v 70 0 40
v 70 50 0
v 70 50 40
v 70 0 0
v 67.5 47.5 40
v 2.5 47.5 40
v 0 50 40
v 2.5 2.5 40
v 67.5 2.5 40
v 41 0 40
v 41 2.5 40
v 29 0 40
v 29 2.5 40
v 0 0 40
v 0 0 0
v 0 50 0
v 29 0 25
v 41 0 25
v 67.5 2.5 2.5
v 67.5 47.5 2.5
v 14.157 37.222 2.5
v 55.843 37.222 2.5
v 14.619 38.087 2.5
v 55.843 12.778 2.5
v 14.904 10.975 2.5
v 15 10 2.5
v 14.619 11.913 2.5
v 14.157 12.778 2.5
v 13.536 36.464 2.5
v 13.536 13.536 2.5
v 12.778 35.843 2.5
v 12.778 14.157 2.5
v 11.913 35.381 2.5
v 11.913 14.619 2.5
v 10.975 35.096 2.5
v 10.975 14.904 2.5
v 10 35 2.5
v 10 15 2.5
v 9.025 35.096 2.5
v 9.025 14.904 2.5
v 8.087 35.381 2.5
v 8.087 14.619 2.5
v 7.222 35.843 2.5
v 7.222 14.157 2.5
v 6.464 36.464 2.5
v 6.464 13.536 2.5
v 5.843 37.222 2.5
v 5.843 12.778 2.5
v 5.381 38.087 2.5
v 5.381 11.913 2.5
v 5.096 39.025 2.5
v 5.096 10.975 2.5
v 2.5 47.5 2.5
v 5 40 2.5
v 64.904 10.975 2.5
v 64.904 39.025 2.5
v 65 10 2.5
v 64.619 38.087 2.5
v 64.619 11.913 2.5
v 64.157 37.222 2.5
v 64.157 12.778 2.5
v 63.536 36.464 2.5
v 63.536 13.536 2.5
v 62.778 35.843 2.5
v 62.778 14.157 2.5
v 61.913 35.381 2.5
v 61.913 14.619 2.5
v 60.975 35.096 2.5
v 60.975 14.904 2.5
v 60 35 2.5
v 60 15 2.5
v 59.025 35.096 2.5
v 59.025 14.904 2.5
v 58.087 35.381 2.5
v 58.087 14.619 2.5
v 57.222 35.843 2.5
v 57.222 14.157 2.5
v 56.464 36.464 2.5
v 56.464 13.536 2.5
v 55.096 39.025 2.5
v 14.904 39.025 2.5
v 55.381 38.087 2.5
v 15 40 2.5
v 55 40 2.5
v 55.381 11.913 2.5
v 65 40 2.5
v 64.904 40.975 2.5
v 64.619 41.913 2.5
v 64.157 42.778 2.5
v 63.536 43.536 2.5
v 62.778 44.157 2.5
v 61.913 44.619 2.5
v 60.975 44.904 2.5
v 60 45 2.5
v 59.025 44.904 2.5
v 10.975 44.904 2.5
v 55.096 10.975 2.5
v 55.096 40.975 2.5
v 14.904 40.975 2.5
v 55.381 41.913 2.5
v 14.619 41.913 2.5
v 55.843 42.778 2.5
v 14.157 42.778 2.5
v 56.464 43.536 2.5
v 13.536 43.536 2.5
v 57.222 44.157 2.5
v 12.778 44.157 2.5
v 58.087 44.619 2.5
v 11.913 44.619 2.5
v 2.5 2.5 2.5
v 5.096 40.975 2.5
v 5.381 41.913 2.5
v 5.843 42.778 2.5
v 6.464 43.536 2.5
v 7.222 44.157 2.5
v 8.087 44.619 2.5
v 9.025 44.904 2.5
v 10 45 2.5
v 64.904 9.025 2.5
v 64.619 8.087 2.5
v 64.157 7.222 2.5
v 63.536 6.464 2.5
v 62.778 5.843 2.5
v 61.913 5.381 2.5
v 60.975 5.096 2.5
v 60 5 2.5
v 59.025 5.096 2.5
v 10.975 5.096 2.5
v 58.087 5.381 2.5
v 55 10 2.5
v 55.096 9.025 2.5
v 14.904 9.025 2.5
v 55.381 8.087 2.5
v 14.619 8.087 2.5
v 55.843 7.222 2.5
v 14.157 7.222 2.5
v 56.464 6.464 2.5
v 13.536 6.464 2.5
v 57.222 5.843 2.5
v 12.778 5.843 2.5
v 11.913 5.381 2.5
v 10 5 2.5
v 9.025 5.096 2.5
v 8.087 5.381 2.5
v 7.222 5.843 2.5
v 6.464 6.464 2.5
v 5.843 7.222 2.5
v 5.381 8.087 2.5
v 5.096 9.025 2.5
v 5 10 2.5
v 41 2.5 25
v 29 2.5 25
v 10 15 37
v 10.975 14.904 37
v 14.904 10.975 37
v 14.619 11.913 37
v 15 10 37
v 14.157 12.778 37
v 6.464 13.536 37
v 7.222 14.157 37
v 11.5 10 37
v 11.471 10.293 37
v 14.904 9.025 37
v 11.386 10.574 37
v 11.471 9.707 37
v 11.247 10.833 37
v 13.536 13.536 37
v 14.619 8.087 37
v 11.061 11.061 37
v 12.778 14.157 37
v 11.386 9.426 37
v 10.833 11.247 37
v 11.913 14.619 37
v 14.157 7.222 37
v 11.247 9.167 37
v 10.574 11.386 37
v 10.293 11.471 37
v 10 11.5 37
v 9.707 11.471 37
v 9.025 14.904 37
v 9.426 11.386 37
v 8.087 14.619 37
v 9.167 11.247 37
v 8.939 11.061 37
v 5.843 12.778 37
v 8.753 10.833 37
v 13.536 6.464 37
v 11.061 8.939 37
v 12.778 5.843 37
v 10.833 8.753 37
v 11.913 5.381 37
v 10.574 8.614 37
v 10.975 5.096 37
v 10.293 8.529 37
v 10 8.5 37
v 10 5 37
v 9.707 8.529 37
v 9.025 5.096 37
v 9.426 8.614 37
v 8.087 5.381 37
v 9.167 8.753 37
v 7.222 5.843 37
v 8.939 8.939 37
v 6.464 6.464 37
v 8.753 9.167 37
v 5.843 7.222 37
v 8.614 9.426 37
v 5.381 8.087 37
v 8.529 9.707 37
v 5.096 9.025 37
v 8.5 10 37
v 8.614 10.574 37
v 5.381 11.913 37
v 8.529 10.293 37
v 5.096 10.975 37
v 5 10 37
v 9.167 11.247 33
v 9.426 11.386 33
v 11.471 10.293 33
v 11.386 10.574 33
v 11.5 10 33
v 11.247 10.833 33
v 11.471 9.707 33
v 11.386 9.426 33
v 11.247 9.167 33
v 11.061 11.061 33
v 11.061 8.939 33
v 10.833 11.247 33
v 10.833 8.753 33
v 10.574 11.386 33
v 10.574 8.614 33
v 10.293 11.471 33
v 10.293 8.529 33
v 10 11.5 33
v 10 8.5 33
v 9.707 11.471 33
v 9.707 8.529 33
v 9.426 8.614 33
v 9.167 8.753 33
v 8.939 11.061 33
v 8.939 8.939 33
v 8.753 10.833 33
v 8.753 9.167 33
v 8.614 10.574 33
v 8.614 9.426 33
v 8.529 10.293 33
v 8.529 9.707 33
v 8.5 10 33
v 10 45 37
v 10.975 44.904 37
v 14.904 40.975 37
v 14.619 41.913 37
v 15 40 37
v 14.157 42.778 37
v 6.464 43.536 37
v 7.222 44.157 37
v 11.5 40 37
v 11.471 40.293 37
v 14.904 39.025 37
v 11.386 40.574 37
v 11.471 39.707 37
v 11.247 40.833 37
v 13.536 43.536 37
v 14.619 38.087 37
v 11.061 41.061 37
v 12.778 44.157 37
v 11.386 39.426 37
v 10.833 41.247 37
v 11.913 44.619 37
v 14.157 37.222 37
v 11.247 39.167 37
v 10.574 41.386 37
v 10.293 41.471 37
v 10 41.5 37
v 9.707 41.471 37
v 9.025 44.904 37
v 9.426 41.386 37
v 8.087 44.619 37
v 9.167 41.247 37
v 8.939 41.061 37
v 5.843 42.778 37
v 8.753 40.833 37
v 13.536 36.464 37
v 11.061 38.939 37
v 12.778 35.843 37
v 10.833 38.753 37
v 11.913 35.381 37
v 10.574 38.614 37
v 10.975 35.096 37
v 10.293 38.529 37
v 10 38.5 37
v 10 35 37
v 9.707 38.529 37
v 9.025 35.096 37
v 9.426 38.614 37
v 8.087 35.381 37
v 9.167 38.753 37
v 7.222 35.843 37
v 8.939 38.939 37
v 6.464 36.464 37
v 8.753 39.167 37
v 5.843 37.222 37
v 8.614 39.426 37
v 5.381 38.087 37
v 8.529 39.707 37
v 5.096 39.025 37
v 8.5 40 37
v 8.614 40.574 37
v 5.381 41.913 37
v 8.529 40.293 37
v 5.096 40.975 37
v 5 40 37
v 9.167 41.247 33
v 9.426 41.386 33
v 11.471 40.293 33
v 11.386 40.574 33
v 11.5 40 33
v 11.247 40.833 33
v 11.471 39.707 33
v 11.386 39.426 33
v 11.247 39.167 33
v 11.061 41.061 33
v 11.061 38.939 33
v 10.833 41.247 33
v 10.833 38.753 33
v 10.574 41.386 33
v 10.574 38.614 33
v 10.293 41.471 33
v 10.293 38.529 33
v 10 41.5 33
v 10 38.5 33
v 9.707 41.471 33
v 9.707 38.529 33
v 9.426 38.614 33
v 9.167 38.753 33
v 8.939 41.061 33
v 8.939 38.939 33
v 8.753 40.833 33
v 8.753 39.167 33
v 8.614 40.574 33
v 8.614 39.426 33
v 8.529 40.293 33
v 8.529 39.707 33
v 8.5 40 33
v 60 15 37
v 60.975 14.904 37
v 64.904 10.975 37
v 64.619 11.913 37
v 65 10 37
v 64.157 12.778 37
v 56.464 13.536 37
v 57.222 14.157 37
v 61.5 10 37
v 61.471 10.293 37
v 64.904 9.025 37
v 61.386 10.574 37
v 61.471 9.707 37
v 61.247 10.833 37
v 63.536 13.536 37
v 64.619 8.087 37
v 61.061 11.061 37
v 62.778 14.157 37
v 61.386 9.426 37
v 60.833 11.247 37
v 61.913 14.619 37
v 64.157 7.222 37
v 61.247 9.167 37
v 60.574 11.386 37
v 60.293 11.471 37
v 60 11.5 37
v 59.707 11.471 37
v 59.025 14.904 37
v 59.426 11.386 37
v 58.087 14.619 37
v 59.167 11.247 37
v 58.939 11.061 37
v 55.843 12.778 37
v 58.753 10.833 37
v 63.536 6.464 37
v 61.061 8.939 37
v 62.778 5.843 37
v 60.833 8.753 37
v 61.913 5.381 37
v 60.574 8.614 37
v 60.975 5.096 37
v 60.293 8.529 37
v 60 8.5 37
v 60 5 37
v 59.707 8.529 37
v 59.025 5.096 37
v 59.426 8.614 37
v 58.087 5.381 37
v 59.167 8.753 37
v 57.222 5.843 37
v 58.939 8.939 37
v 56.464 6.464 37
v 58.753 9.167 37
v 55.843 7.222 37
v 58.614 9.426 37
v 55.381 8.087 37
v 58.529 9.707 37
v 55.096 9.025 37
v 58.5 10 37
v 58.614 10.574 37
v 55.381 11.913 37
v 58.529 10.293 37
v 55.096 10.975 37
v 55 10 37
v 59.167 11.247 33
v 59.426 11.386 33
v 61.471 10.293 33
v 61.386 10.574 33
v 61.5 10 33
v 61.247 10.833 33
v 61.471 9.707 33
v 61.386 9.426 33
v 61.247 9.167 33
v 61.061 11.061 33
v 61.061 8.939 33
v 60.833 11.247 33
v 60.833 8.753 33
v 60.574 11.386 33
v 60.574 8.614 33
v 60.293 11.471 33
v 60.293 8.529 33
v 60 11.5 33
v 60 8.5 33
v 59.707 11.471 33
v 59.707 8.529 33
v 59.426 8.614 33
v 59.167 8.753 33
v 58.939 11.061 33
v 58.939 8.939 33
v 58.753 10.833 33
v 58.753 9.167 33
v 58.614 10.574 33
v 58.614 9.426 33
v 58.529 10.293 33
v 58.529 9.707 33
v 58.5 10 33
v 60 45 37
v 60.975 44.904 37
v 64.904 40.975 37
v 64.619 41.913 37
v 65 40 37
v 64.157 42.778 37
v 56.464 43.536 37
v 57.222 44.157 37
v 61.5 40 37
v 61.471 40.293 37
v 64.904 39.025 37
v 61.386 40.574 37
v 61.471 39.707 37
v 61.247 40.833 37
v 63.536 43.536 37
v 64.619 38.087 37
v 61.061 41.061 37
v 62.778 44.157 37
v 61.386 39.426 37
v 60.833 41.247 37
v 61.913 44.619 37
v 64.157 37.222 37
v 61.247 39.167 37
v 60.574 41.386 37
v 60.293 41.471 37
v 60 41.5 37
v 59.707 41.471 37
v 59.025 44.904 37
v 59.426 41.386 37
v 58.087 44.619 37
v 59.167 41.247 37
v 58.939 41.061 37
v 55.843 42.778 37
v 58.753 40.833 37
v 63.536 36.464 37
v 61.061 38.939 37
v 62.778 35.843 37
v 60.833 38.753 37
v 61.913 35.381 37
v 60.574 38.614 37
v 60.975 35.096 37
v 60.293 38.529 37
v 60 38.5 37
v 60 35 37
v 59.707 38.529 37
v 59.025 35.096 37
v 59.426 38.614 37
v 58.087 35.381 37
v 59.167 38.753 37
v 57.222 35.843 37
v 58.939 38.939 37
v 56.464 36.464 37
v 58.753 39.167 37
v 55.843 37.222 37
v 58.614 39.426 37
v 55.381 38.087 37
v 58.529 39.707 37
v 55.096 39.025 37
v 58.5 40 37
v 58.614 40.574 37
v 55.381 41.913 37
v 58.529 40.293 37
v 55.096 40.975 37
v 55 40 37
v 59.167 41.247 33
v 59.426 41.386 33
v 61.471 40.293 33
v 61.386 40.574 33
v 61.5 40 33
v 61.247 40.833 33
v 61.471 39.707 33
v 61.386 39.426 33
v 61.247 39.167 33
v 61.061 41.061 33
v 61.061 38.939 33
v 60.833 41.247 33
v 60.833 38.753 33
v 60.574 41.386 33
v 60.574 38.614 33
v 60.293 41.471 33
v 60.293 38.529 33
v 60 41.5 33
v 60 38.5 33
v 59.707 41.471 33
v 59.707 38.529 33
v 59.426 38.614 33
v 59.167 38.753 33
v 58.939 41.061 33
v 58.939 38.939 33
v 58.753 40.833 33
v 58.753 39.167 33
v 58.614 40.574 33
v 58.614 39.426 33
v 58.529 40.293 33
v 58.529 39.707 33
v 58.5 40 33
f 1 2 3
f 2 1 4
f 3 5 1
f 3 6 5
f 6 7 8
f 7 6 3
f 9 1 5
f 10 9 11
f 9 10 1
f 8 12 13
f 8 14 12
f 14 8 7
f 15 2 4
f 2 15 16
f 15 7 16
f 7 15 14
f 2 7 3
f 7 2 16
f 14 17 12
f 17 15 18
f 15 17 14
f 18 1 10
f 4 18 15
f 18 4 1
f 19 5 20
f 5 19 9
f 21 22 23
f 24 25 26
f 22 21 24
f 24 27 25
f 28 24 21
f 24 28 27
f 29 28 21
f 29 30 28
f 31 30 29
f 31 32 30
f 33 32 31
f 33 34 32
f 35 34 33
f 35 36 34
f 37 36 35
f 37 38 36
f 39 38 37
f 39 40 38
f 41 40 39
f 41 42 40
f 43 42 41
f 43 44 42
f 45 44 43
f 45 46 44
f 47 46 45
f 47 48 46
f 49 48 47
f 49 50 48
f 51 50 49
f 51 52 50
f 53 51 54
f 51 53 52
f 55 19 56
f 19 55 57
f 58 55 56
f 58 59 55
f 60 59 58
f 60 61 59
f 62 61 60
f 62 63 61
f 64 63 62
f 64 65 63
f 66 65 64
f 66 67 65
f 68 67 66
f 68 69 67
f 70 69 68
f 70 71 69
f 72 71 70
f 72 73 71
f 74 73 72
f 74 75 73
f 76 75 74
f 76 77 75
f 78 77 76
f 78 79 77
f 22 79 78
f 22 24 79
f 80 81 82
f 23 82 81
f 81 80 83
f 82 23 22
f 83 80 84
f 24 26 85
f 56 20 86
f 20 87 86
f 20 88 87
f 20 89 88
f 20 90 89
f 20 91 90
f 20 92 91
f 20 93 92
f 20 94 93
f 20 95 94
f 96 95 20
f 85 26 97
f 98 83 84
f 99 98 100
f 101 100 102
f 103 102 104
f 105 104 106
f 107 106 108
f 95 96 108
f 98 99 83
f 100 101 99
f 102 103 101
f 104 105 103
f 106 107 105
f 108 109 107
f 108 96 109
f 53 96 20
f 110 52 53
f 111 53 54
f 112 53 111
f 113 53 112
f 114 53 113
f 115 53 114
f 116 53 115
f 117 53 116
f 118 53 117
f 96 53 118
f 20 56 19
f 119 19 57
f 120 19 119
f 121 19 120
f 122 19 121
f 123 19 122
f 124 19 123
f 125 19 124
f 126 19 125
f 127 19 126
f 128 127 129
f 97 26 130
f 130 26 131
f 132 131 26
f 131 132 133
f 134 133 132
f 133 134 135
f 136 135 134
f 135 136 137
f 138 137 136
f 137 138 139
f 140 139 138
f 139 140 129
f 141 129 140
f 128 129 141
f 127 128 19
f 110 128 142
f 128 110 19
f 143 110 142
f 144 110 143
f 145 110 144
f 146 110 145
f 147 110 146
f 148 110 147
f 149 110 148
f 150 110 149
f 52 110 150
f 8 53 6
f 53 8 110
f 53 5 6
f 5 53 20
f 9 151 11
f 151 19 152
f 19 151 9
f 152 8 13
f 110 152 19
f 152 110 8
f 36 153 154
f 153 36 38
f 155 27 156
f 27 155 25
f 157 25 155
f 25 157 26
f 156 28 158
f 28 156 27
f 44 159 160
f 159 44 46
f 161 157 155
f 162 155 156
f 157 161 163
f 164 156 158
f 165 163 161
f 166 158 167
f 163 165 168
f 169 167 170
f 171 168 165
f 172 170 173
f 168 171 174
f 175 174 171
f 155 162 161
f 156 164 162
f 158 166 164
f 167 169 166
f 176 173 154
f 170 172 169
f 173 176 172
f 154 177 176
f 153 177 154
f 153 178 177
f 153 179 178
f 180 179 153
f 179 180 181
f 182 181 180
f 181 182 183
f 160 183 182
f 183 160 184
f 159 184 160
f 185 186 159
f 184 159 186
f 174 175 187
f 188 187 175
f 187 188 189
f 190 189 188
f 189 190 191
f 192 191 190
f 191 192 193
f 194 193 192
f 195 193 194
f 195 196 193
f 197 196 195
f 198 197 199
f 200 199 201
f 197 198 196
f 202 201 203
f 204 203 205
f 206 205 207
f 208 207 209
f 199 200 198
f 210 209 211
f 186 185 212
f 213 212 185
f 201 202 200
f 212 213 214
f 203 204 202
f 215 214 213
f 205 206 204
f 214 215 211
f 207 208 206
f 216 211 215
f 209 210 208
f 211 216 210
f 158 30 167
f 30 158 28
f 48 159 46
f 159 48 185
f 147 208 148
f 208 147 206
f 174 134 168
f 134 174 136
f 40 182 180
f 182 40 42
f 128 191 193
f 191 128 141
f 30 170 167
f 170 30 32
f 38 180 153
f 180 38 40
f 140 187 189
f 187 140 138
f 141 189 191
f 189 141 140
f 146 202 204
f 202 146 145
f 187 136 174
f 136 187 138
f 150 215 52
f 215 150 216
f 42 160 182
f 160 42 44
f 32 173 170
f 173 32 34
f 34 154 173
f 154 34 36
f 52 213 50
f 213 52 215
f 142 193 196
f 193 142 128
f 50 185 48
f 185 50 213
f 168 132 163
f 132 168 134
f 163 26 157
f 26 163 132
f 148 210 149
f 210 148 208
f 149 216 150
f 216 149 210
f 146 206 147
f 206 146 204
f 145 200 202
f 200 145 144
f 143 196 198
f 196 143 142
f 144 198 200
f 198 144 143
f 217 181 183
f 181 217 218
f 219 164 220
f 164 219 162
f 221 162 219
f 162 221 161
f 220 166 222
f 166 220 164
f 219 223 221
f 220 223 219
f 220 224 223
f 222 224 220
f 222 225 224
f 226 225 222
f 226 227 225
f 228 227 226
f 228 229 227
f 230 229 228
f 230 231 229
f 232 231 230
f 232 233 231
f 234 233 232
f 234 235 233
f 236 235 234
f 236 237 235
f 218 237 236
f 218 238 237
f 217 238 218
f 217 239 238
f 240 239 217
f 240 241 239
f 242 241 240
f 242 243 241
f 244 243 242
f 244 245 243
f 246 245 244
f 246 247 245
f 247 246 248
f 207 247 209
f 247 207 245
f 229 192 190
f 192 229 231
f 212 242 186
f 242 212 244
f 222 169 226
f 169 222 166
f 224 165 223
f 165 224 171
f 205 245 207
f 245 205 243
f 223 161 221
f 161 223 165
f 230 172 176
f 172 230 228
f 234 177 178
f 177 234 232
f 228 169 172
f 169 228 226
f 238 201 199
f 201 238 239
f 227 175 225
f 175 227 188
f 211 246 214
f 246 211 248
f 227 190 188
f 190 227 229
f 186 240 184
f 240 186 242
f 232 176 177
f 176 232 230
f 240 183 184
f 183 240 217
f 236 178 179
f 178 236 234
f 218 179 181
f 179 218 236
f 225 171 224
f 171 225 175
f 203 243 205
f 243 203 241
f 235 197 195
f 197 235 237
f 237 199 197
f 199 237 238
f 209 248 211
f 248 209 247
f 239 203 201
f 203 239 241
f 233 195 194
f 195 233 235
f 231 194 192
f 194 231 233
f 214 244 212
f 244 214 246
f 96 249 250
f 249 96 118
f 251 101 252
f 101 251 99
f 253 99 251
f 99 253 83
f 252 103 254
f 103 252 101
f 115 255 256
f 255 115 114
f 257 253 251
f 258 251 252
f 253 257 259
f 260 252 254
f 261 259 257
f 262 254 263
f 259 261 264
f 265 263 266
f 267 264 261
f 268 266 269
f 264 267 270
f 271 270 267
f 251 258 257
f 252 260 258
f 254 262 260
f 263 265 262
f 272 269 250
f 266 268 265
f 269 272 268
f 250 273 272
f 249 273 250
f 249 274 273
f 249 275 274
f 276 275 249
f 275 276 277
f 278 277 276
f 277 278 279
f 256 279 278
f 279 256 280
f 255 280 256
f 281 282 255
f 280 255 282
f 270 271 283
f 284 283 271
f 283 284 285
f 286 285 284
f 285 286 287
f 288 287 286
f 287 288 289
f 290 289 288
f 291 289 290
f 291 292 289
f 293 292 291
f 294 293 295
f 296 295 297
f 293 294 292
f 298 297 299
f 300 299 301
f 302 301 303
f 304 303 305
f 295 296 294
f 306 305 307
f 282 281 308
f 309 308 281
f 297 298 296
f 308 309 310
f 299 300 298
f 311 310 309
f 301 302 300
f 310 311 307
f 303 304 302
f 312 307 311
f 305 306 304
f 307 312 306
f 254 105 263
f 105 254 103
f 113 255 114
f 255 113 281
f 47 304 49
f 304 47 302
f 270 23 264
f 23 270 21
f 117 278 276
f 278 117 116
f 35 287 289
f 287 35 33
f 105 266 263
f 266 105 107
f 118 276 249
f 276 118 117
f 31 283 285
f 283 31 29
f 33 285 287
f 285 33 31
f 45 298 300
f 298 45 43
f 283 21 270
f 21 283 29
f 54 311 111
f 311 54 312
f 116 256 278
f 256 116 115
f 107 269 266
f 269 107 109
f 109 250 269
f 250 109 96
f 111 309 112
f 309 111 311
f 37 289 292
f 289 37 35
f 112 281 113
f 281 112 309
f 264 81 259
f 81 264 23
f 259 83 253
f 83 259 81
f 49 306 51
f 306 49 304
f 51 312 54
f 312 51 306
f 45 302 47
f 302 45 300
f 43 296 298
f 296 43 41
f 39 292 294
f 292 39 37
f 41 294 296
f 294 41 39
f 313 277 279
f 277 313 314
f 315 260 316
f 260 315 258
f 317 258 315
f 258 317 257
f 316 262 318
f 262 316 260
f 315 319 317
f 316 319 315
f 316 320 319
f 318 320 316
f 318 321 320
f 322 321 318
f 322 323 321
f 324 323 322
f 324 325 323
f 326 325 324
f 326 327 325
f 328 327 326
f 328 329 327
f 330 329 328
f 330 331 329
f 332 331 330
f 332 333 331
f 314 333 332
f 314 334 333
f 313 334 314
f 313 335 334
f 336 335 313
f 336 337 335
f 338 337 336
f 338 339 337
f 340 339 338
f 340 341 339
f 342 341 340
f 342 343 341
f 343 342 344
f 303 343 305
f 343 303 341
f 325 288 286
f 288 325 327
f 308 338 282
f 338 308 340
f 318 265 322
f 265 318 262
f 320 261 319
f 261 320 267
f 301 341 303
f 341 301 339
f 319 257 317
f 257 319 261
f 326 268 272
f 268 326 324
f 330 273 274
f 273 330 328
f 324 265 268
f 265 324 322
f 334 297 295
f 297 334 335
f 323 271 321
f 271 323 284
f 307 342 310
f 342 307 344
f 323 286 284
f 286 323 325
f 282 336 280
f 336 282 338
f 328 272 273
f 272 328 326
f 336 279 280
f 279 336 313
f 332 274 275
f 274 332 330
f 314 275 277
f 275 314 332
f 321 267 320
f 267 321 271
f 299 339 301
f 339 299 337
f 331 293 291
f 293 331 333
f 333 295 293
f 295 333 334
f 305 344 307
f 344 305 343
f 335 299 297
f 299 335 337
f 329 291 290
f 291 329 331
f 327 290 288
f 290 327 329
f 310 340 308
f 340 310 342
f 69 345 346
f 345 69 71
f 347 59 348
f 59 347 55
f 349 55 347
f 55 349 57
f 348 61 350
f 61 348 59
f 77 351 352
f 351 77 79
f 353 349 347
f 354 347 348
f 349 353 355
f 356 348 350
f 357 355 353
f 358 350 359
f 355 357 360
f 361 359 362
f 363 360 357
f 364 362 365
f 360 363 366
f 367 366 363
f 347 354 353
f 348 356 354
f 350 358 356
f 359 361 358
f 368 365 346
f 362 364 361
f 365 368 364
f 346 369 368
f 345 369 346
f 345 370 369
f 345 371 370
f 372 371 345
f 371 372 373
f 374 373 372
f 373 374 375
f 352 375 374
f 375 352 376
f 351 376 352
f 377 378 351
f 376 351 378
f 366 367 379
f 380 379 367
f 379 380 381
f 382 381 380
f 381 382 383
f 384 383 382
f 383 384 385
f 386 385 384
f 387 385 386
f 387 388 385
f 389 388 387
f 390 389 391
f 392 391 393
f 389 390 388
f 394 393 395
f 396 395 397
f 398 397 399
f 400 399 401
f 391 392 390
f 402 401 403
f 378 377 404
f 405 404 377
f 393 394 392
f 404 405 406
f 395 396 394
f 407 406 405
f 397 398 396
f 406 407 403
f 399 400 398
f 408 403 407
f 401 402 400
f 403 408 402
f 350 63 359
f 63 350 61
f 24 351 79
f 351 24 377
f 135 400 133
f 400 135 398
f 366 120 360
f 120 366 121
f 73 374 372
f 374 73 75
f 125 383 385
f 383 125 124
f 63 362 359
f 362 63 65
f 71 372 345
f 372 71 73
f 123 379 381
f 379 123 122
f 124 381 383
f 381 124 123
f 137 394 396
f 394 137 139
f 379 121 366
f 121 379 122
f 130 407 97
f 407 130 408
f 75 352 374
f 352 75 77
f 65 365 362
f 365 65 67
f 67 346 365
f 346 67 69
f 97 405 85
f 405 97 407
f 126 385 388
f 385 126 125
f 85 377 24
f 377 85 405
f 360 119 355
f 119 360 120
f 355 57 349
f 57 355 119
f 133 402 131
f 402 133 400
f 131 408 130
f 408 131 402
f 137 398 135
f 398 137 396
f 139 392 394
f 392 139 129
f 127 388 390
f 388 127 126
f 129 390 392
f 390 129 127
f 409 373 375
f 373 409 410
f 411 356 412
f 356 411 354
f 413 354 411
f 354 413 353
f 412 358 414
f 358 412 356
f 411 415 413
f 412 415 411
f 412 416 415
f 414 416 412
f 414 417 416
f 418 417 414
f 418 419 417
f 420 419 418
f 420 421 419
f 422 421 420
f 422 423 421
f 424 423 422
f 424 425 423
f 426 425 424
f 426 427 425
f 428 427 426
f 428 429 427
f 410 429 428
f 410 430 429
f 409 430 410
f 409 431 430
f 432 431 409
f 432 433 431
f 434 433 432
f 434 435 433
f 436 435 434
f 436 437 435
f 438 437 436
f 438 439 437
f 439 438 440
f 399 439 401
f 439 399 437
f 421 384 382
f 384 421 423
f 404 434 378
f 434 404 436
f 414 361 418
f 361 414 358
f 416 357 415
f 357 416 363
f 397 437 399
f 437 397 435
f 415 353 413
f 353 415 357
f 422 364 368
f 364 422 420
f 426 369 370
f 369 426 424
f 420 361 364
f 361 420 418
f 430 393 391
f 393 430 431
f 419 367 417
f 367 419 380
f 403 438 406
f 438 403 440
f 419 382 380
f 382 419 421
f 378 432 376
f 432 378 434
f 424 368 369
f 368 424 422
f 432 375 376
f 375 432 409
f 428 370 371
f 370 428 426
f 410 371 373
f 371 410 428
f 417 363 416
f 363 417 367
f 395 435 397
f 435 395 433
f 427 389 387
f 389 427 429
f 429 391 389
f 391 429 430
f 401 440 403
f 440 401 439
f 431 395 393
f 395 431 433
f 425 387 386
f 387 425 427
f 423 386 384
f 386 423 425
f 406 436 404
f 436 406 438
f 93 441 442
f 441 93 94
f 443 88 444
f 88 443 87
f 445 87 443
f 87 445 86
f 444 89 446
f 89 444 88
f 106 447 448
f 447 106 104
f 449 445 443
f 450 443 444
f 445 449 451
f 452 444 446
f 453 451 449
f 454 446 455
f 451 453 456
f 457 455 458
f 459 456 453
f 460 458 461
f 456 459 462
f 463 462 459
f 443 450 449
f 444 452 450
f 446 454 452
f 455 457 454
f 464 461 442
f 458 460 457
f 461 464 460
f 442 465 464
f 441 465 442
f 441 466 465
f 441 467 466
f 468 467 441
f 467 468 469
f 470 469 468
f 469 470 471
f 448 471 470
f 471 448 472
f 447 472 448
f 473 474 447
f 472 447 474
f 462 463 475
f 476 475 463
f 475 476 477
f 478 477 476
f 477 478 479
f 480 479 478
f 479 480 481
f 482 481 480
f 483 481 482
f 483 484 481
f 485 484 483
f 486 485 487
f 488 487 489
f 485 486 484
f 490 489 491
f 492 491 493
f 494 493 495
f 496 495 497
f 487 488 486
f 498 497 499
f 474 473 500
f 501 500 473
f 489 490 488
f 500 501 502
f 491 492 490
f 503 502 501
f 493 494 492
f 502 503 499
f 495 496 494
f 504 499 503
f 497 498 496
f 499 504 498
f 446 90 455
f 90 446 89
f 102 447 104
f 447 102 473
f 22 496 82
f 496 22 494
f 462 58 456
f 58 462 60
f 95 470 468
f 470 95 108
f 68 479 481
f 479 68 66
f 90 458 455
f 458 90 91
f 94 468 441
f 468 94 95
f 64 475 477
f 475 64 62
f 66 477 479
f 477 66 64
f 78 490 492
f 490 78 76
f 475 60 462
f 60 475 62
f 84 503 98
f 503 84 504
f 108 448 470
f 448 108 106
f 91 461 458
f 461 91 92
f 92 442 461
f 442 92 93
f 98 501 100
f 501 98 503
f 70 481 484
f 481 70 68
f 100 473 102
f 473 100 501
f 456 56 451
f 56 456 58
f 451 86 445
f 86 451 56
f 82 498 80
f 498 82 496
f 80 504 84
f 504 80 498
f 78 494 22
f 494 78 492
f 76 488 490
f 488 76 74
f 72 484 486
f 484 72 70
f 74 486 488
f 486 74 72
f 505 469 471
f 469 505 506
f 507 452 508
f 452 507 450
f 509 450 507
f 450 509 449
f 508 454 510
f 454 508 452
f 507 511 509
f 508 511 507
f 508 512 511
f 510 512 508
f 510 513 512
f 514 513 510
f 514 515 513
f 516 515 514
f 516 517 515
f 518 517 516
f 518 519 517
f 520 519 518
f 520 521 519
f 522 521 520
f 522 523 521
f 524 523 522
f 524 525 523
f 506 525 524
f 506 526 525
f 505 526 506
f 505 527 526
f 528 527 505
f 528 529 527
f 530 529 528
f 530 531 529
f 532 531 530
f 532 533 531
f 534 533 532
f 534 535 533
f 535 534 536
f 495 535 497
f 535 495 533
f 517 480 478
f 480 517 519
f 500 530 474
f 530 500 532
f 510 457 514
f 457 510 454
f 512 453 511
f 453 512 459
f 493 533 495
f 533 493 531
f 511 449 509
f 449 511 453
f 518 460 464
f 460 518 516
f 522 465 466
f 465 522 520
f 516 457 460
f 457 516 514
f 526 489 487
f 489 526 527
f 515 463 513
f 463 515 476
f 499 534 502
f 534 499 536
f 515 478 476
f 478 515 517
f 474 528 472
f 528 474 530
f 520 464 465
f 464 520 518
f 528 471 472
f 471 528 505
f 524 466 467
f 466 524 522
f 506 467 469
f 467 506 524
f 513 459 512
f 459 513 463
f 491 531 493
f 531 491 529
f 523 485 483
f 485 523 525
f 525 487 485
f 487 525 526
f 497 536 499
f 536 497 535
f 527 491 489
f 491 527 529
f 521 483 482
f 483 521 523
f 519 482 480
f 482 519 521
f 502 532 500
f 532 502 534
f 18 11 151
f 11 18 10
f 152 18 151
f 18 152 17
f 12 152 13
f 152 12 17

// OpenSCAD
$fn = 32;

// ----------------------------------------------------------------------
// Enclosure box: both enclosure
// ----------------------------------------------------------------------

// --- parameters (mm) ---
box_l = 70;               // outer length, X
box_w = 50;               // outer width, Y
box_h = 40;               // outer height
wall_t = 2.5;             // wall thickness
boss_r = 5;               // corner boss radius
hole_r = 1.5;             // boss screw hole radius
boss_in = 10;             // boss inset from the corners
notch_w = 12;             // cable notch width
notch_h = 15;             // cable notch height

inner_h = box_h - wall_t;  // cavity depth
boss_h = inner_h - 2;  // corner boss height

difference() {
  union() {
    difference() {
      cube([box_l, box_w, box_h]);
      translate([wall_t, wall_t, wall_t])
        cube([box_l - 2 * wall_t, box_w - 2 * wall_t, box_h]);
    }
    for (sx = [0, 1], sy = [0, 1])
      translate([sx ? box_l - boss_in : boss_in,
                 sy ? box_w - boss_in : boss_in, wall_t - 1])
        difference() {
          cylinder(r = boss_r, h = boss_h);
          translate([0, 0, boss_h - 4])
            cylinder(r = hole_r, h = 5);
        }
  }
  translate([box_l / 2 - notch_w / 2, -1, box_h - notch_h])
    cube([notch_w, wall_t + 2, notch_h + 1]);
}
